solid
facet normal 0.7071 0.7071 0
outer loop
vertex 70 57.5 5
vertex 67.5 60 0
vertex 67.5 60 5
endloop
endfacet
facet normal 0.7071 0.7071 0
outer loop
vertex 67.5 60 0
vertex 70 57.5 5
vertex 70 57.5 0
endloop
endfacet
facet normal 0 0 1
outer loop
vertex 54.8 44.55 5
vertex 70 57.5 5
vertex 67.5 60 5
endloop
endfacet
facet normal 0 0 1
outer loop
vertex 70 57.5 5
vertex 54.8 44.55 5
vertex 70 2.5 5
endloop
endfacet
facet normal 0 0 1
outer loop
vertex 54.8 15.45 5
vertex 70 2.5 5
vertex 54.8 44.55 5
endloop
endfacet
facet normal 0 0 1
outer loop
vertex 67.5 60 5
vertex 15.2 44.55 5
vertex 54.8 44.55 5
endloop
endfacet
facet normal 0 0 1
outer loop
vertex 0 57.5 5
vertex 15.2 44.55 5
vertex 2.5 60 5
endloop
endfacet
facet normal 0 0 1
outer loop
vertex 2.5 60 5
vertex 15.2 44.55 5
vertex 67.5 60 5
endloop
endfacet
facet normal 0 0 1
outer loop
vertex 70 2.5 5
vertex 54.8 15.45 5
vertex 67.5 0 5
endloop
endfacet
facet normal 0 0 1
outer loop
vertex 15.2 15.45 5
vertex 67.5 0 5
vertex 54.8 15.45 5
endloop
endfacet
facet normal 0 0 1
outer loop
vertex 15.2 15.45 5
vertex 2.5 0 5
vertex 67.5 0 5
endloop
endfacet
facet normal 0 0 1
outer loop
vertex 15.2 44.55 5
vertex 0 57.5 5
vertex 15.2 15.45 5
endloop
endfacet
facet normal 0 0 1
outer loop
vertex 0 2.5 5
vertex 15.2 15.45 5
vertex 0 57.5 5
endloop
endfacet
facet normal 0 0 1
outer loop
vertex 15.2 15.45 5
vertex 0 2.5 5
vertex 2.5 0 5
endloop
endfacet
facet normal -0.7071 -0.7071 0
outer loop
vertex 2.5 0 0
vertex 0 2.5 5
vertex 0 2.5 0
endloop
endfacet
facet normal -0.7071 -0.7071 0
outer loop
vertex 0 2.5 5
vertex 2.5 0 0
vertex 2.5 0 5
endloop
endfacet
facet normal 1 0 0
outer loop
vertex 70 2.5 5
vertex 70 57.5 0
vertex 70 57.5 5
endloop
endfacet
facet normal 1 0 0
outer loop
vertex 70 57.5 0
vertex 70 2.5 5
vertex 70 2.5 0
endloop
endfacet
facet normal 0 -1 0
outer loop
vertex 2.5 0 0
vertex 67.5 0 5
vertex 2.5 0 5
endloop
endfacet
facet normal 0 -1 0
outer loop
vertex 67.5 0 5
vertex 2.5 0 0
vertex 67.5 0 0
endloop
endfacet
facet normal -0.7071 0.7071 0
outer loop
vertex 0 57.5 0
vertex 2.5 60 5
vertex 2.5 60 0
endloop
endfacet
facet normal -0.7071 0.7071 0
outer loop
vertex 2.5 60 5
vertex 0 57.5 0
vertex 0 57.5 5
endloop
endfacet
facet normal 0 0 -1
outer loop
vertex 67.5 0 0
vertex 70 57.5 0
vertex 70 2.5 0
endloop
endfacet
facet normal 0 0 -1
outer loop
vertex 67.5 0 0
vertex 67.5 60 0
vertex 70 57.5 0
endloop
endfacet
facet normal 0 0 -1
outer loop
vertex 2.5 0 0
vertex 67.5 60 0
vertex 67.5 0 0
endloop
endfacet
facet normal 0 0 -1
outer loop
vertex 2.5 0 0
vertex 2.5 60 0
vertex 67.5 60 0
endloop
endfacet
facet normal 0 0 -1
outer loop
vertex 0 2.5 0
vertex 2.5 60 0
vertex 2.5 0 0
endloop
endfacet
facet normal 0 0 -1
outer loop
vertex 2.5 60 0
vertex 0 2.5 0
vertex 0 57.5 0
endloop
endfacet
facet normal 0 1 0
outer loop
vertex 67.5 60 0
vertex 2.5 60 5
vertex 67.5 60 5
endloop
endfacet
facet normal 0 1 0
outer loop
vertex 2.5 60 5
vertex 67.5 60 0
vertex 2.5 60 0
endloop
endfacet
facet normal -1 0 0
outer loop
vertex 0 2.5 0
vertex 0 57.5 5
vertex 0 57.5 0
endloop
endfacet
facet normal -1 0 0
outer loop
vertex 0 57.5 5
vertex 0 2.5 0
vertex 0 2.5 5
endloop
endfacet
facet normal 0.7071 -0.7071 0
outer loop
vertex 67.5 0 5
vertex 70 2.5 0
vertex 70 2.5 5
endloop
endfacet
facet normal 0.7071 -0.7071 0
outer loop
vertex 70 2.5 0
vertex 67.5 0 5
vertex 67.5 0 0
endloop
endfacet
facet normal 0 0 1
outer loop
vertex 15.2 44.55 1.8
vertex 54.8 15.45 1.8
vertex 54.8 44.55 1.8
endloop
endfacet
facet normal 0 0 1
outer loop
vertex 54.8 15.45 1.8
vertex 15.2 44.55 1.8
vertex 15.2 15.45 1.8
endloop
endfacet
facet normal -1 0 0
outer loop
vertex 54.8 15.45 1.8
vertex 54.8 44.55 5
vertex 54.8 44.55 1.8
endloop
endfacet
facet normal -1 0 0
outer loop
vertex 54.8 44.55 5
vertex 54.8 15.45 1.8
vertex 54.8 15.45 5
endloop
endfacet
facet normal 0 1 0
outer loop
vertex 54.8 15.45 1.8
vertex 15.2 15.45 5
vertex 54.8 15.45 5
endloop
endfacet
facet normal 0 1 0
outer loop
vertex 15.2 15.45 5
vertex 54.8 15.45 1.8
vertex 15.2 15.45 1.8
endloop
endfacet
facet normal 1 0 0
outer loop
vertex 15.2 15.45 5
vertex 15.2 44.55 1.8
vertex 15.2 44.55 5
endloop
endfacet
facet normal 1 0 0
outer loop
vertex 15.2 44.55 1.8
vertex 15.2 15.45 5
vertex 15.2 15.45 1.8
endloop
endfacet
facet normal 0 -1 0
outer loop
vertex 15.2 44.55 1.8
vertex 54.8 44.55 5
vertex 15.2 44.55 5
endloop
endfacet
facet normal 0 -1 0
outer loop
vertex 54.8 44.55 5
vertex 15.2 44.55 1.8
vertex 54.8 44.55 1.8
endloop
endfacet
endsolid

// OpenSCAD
$fn = 32;

// ----------------------------------------------------------------------
// Windowed plate: 1 voids, 70 x 60 x 5 mm
// ----------------------------------------------------------------------

// --- parameters (mm) ---
plate_l = 70;             // plate length, X
plate_w = 60;             // plate width, Y
plate_t = 5;              // plate thickness, Z
edge_margin = 12;         // wall from the plate edge to any window
win1_l = 39.6;            // window length
win1_w = 29.1;            // window width
depth_1 = 3.2;            // depth of void 1 (full thickness = through)
corner_c = 2.5;           // corner chamfer of the plate

profile = [[2.5, 0], [67.5, 0], [70, 2.5], [70, 57.5], [67.5, 60], [2.5, 60], [0, 57.5], [0, 2.5]];  // primary outline, 8 points, counter clockwise
void_1 = [[15.2, 15.45], [54.8, 15.45], [54.8, 44.55], [15.2, 44.55]];  // large central window, 4 points

// --- the one profile operation ---
difference() {
  linear_extrude(height = plate_t) polygon(points = profile);
  translate([0, 0, plate_t - depth_1])
    linear_extrude(height = depth_1 + 1) polygon(points = void_1);
}
